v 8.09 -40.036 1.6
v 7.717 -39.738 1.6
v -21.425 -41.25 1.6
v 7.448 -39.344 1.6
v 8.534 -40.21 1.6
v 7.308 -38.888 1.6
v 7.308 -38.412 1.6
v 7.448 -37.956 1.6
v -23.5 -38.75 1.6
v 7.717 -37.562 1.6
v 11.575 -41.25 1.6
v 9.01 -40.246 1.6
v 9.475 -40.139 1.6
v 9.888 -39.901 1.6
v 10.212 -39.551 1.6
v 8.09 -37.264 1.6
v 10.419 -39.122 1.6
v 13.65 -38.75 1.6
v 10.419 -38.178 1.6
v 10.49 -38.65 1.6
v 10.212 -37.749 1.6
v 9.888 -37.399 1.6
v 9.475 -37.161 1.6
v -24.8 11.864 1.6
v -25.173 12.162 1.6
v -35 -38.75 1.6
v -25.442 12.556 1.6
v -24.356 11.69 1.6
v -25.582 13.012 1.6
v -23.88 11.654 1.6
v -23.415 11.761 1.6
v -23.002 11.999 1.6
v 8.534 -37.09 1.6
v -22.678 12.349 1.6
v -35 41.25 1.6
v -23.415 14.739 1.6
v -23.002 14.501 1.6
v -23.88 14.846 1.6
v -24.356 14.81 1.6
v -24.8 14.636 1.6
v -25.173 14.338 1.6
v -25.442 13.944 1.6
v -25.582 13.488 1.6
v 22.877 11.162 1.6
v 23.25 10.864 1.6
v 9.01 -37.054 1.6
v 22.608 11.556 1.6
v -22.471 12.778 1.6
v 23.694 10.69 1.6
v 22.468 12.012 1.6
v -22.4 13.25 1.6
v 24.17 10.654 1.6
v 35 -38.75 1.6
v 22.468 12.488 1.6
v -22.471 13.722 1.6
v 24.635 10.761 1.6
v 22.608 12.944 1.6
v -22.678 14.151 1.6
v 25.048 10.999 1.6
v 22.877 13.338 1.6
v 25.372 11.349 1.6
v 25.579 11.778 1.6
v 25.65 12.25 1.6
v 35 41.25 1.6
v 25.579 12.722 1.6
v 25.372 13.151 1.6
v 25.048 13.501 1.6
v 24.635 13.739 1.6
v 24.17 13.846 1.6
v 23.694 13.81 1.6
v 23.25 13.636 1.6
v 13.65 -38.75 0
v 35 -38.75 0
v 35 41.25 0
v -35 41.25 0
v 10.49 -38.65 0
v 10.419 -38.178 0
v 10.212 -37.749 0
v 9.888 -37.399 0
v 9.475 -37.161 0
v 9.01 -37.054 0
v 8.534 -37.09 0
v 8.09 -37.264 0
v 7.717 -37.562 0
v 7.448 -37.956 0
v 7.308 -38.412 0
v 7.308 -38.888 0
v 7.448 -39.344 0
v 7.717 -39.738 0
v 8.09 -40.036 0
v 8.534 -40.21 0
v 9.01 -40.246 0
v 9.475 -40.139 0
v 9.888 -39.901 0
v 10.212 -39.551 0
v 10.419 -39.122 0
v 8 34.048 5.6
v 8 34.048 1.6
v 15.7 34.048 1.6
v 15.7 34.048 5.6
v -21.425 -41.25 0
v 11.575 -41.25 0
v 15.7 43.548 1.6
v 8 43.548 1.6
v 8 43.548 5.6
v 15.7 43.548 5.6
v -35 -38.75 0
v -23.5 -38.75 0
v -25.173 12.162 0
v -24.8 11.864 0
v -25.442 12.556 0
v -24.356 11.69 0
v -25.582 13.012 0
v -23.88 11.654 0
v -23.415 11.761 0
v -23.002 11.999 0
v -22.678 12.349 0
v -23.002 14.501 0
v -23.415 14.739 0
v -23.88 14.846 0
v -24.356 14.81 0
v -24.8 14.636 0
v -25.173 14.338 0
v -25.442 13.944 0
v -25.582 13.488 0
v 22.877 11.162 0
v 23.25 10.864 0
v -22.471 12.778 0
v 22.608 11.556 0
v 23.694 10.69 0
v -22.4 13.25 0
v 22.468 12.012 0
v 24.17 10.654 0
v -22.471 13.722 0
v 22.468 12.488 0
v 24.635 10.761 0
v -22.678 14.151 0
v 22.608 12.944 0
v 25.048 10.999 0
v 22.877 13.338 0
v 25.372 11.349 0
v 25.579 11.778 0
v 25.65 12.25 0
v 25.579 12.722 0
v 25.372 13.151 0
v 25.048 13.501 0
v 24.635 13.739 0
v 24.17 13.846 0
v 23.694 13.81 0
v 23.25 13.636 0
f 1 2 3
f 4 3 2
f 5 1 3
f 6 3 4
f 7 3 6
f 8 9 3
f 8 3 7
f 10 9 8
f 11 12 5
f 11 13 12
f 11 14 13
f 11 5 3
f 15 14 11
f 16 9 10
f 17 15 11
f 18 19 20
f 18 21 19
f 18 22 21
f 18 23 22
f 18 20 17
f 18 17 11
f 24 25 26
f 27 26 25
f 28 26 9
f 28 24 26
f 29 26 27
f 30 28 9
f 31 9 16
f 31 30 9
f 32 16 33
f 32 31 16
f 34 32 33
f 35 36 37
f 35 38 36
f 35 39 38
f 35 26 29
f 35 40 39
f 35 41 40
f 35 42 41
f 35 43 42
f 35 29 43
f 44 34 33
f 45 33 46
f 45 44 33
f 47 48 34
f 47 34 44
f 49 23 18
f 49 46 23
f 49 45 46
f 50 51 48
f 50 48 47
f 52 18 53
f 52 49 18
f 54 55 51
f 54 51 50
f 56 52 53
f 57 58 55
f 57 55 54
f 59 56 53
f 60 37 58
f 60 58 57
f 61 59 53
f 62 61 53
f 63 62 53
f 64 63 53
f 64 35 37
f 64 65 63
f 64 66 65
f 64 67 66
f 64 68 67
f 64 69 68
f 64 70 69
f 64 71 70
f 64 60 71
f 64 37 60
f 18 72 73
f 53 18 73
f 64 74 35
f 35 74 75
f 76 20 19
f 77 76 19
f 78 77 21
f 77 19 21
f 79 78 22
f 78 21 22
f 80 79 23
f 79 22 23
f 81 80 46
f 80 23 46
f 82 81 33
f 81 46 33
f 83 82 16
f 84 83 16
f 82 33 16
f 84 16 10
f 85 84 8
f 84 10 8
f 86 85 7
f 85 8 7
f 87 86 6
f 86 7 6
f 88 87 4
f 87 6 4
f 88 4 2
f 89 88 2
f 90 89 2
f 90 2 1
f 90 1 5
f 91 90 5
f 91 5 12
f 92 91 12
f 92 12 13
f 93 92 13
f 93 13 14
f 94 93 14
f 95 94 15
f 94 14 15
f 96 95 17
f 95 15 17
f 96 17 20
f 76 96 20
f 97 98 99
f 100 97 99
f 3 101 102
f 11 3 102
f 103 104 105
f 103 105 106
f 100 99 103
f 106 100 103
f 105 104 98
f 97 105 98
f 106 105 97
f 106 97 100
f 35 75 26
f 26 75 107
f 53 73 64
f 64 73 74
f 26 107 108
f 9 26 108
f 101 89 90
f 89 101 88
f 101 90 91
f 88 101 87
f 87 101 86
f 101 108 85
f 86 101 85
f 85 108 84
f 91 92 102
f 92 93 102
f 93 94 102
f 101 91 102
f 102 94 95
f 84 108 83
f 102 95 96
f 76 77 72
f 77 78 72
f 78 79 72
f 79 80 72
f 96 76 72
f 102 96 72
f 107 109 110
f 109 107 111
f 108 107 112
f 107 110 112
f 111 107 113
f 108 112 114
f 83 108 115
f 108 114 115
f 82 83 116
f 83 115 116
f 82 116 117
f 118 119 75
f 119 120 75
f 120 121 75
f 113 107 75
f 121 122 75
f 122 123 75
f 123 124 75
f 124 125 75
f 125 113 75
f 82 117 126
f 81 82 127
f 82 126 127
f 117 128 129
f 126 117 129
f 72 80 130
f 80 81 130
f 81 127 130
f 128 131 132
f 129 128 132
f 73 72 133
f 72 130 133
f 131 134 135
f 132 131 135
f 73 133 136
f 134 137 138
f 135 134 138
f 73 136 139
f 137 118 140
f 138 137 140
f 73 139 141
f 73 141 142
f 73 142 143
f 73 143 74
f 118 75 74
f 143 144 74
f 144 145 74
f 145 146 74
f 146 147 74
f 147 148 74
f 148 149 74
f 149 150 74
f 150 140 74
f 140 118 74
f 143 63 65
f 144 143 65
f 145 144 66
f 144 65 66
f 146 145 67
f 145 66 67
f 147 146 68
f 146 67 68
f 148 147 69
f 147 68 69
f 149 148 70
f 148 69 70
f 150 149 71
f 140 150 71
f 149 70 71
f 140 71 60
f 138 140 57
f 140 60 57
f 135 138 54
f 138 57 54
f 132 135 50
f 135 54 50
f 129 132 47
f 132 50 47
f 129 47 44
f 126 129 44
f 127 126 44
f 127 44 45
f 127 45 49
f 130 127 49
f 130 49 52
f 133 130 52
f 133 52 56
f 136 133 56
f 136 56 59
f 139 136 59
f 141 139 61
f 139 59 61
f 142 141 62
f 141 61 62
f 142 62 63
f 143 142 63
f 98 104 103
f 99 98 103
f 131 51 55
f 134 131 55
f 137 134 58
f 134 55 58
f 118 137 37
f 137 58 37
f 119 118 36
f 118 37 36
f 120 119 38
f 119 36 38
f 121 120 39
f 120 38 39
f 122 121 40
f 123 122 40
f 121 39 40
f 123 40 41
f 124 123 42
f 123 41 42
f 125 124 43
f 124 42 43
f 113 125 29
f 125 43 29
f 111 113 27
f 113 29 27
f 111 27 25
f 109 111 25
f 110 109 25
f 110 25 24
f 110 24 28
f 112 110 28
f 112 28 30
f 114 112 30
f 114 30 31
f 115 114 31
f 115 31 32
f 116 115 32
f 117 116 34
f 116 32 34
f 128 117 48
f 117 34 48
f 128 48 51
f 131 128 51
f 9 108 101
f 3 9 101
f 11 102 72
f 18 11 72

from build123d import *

# Parameters (mm, degrees)
F1_DEPTH = 1.6
F2_R     = 1.6
F3_DEPTH = 1.6
F4_W     = 7.7
F4_H     = 2.298387
F4_H_2   = 7.201613
F5_DEPTH = 4


with BuildPart() as f1:
    # F0 (on Top) → F1 (new body)
    with BuildSketch(Plane.XY):
        Polygon((35, 41.25), (-35, 41.25), (-35, -38.75), (-23.5, -38.75), (-21.425, -41.25), (11.575, -41.25), (13.65, -38.75), (35, -38.75), align=None)
    extrude(amount=F1_DEPTH)

    # F2 (on face) → F3 (cut, through all)
    with BuildSketch(Plane.XY.offset(1.6)):
        with Locations((-24, 13.25)):
            Circle(F2_R)
        with Locations((24.05, 12.25)):
            Circle(F2_R)
        with Locations((8.89, -38.65)):
            Circle(F2_R)
    extrude(amount=-F3_DEPTH, mode=Mode.SUBTRACT)


with BuildPart() as f5:
    # F4 (on face) → F5 (new body)
    with BuildSketch(Plane.XY.offset(1.6)):
        with Locations((11.85, 42.399193)):
            Rectangle(F4_W, F4_H)
        with Locations((11.85, 37.649193)):
            Rectangle(F4_W, F4_H_2)
    extrude(amount=F5_DEPTH)


solid = Compound([f1.part, f5.part])
